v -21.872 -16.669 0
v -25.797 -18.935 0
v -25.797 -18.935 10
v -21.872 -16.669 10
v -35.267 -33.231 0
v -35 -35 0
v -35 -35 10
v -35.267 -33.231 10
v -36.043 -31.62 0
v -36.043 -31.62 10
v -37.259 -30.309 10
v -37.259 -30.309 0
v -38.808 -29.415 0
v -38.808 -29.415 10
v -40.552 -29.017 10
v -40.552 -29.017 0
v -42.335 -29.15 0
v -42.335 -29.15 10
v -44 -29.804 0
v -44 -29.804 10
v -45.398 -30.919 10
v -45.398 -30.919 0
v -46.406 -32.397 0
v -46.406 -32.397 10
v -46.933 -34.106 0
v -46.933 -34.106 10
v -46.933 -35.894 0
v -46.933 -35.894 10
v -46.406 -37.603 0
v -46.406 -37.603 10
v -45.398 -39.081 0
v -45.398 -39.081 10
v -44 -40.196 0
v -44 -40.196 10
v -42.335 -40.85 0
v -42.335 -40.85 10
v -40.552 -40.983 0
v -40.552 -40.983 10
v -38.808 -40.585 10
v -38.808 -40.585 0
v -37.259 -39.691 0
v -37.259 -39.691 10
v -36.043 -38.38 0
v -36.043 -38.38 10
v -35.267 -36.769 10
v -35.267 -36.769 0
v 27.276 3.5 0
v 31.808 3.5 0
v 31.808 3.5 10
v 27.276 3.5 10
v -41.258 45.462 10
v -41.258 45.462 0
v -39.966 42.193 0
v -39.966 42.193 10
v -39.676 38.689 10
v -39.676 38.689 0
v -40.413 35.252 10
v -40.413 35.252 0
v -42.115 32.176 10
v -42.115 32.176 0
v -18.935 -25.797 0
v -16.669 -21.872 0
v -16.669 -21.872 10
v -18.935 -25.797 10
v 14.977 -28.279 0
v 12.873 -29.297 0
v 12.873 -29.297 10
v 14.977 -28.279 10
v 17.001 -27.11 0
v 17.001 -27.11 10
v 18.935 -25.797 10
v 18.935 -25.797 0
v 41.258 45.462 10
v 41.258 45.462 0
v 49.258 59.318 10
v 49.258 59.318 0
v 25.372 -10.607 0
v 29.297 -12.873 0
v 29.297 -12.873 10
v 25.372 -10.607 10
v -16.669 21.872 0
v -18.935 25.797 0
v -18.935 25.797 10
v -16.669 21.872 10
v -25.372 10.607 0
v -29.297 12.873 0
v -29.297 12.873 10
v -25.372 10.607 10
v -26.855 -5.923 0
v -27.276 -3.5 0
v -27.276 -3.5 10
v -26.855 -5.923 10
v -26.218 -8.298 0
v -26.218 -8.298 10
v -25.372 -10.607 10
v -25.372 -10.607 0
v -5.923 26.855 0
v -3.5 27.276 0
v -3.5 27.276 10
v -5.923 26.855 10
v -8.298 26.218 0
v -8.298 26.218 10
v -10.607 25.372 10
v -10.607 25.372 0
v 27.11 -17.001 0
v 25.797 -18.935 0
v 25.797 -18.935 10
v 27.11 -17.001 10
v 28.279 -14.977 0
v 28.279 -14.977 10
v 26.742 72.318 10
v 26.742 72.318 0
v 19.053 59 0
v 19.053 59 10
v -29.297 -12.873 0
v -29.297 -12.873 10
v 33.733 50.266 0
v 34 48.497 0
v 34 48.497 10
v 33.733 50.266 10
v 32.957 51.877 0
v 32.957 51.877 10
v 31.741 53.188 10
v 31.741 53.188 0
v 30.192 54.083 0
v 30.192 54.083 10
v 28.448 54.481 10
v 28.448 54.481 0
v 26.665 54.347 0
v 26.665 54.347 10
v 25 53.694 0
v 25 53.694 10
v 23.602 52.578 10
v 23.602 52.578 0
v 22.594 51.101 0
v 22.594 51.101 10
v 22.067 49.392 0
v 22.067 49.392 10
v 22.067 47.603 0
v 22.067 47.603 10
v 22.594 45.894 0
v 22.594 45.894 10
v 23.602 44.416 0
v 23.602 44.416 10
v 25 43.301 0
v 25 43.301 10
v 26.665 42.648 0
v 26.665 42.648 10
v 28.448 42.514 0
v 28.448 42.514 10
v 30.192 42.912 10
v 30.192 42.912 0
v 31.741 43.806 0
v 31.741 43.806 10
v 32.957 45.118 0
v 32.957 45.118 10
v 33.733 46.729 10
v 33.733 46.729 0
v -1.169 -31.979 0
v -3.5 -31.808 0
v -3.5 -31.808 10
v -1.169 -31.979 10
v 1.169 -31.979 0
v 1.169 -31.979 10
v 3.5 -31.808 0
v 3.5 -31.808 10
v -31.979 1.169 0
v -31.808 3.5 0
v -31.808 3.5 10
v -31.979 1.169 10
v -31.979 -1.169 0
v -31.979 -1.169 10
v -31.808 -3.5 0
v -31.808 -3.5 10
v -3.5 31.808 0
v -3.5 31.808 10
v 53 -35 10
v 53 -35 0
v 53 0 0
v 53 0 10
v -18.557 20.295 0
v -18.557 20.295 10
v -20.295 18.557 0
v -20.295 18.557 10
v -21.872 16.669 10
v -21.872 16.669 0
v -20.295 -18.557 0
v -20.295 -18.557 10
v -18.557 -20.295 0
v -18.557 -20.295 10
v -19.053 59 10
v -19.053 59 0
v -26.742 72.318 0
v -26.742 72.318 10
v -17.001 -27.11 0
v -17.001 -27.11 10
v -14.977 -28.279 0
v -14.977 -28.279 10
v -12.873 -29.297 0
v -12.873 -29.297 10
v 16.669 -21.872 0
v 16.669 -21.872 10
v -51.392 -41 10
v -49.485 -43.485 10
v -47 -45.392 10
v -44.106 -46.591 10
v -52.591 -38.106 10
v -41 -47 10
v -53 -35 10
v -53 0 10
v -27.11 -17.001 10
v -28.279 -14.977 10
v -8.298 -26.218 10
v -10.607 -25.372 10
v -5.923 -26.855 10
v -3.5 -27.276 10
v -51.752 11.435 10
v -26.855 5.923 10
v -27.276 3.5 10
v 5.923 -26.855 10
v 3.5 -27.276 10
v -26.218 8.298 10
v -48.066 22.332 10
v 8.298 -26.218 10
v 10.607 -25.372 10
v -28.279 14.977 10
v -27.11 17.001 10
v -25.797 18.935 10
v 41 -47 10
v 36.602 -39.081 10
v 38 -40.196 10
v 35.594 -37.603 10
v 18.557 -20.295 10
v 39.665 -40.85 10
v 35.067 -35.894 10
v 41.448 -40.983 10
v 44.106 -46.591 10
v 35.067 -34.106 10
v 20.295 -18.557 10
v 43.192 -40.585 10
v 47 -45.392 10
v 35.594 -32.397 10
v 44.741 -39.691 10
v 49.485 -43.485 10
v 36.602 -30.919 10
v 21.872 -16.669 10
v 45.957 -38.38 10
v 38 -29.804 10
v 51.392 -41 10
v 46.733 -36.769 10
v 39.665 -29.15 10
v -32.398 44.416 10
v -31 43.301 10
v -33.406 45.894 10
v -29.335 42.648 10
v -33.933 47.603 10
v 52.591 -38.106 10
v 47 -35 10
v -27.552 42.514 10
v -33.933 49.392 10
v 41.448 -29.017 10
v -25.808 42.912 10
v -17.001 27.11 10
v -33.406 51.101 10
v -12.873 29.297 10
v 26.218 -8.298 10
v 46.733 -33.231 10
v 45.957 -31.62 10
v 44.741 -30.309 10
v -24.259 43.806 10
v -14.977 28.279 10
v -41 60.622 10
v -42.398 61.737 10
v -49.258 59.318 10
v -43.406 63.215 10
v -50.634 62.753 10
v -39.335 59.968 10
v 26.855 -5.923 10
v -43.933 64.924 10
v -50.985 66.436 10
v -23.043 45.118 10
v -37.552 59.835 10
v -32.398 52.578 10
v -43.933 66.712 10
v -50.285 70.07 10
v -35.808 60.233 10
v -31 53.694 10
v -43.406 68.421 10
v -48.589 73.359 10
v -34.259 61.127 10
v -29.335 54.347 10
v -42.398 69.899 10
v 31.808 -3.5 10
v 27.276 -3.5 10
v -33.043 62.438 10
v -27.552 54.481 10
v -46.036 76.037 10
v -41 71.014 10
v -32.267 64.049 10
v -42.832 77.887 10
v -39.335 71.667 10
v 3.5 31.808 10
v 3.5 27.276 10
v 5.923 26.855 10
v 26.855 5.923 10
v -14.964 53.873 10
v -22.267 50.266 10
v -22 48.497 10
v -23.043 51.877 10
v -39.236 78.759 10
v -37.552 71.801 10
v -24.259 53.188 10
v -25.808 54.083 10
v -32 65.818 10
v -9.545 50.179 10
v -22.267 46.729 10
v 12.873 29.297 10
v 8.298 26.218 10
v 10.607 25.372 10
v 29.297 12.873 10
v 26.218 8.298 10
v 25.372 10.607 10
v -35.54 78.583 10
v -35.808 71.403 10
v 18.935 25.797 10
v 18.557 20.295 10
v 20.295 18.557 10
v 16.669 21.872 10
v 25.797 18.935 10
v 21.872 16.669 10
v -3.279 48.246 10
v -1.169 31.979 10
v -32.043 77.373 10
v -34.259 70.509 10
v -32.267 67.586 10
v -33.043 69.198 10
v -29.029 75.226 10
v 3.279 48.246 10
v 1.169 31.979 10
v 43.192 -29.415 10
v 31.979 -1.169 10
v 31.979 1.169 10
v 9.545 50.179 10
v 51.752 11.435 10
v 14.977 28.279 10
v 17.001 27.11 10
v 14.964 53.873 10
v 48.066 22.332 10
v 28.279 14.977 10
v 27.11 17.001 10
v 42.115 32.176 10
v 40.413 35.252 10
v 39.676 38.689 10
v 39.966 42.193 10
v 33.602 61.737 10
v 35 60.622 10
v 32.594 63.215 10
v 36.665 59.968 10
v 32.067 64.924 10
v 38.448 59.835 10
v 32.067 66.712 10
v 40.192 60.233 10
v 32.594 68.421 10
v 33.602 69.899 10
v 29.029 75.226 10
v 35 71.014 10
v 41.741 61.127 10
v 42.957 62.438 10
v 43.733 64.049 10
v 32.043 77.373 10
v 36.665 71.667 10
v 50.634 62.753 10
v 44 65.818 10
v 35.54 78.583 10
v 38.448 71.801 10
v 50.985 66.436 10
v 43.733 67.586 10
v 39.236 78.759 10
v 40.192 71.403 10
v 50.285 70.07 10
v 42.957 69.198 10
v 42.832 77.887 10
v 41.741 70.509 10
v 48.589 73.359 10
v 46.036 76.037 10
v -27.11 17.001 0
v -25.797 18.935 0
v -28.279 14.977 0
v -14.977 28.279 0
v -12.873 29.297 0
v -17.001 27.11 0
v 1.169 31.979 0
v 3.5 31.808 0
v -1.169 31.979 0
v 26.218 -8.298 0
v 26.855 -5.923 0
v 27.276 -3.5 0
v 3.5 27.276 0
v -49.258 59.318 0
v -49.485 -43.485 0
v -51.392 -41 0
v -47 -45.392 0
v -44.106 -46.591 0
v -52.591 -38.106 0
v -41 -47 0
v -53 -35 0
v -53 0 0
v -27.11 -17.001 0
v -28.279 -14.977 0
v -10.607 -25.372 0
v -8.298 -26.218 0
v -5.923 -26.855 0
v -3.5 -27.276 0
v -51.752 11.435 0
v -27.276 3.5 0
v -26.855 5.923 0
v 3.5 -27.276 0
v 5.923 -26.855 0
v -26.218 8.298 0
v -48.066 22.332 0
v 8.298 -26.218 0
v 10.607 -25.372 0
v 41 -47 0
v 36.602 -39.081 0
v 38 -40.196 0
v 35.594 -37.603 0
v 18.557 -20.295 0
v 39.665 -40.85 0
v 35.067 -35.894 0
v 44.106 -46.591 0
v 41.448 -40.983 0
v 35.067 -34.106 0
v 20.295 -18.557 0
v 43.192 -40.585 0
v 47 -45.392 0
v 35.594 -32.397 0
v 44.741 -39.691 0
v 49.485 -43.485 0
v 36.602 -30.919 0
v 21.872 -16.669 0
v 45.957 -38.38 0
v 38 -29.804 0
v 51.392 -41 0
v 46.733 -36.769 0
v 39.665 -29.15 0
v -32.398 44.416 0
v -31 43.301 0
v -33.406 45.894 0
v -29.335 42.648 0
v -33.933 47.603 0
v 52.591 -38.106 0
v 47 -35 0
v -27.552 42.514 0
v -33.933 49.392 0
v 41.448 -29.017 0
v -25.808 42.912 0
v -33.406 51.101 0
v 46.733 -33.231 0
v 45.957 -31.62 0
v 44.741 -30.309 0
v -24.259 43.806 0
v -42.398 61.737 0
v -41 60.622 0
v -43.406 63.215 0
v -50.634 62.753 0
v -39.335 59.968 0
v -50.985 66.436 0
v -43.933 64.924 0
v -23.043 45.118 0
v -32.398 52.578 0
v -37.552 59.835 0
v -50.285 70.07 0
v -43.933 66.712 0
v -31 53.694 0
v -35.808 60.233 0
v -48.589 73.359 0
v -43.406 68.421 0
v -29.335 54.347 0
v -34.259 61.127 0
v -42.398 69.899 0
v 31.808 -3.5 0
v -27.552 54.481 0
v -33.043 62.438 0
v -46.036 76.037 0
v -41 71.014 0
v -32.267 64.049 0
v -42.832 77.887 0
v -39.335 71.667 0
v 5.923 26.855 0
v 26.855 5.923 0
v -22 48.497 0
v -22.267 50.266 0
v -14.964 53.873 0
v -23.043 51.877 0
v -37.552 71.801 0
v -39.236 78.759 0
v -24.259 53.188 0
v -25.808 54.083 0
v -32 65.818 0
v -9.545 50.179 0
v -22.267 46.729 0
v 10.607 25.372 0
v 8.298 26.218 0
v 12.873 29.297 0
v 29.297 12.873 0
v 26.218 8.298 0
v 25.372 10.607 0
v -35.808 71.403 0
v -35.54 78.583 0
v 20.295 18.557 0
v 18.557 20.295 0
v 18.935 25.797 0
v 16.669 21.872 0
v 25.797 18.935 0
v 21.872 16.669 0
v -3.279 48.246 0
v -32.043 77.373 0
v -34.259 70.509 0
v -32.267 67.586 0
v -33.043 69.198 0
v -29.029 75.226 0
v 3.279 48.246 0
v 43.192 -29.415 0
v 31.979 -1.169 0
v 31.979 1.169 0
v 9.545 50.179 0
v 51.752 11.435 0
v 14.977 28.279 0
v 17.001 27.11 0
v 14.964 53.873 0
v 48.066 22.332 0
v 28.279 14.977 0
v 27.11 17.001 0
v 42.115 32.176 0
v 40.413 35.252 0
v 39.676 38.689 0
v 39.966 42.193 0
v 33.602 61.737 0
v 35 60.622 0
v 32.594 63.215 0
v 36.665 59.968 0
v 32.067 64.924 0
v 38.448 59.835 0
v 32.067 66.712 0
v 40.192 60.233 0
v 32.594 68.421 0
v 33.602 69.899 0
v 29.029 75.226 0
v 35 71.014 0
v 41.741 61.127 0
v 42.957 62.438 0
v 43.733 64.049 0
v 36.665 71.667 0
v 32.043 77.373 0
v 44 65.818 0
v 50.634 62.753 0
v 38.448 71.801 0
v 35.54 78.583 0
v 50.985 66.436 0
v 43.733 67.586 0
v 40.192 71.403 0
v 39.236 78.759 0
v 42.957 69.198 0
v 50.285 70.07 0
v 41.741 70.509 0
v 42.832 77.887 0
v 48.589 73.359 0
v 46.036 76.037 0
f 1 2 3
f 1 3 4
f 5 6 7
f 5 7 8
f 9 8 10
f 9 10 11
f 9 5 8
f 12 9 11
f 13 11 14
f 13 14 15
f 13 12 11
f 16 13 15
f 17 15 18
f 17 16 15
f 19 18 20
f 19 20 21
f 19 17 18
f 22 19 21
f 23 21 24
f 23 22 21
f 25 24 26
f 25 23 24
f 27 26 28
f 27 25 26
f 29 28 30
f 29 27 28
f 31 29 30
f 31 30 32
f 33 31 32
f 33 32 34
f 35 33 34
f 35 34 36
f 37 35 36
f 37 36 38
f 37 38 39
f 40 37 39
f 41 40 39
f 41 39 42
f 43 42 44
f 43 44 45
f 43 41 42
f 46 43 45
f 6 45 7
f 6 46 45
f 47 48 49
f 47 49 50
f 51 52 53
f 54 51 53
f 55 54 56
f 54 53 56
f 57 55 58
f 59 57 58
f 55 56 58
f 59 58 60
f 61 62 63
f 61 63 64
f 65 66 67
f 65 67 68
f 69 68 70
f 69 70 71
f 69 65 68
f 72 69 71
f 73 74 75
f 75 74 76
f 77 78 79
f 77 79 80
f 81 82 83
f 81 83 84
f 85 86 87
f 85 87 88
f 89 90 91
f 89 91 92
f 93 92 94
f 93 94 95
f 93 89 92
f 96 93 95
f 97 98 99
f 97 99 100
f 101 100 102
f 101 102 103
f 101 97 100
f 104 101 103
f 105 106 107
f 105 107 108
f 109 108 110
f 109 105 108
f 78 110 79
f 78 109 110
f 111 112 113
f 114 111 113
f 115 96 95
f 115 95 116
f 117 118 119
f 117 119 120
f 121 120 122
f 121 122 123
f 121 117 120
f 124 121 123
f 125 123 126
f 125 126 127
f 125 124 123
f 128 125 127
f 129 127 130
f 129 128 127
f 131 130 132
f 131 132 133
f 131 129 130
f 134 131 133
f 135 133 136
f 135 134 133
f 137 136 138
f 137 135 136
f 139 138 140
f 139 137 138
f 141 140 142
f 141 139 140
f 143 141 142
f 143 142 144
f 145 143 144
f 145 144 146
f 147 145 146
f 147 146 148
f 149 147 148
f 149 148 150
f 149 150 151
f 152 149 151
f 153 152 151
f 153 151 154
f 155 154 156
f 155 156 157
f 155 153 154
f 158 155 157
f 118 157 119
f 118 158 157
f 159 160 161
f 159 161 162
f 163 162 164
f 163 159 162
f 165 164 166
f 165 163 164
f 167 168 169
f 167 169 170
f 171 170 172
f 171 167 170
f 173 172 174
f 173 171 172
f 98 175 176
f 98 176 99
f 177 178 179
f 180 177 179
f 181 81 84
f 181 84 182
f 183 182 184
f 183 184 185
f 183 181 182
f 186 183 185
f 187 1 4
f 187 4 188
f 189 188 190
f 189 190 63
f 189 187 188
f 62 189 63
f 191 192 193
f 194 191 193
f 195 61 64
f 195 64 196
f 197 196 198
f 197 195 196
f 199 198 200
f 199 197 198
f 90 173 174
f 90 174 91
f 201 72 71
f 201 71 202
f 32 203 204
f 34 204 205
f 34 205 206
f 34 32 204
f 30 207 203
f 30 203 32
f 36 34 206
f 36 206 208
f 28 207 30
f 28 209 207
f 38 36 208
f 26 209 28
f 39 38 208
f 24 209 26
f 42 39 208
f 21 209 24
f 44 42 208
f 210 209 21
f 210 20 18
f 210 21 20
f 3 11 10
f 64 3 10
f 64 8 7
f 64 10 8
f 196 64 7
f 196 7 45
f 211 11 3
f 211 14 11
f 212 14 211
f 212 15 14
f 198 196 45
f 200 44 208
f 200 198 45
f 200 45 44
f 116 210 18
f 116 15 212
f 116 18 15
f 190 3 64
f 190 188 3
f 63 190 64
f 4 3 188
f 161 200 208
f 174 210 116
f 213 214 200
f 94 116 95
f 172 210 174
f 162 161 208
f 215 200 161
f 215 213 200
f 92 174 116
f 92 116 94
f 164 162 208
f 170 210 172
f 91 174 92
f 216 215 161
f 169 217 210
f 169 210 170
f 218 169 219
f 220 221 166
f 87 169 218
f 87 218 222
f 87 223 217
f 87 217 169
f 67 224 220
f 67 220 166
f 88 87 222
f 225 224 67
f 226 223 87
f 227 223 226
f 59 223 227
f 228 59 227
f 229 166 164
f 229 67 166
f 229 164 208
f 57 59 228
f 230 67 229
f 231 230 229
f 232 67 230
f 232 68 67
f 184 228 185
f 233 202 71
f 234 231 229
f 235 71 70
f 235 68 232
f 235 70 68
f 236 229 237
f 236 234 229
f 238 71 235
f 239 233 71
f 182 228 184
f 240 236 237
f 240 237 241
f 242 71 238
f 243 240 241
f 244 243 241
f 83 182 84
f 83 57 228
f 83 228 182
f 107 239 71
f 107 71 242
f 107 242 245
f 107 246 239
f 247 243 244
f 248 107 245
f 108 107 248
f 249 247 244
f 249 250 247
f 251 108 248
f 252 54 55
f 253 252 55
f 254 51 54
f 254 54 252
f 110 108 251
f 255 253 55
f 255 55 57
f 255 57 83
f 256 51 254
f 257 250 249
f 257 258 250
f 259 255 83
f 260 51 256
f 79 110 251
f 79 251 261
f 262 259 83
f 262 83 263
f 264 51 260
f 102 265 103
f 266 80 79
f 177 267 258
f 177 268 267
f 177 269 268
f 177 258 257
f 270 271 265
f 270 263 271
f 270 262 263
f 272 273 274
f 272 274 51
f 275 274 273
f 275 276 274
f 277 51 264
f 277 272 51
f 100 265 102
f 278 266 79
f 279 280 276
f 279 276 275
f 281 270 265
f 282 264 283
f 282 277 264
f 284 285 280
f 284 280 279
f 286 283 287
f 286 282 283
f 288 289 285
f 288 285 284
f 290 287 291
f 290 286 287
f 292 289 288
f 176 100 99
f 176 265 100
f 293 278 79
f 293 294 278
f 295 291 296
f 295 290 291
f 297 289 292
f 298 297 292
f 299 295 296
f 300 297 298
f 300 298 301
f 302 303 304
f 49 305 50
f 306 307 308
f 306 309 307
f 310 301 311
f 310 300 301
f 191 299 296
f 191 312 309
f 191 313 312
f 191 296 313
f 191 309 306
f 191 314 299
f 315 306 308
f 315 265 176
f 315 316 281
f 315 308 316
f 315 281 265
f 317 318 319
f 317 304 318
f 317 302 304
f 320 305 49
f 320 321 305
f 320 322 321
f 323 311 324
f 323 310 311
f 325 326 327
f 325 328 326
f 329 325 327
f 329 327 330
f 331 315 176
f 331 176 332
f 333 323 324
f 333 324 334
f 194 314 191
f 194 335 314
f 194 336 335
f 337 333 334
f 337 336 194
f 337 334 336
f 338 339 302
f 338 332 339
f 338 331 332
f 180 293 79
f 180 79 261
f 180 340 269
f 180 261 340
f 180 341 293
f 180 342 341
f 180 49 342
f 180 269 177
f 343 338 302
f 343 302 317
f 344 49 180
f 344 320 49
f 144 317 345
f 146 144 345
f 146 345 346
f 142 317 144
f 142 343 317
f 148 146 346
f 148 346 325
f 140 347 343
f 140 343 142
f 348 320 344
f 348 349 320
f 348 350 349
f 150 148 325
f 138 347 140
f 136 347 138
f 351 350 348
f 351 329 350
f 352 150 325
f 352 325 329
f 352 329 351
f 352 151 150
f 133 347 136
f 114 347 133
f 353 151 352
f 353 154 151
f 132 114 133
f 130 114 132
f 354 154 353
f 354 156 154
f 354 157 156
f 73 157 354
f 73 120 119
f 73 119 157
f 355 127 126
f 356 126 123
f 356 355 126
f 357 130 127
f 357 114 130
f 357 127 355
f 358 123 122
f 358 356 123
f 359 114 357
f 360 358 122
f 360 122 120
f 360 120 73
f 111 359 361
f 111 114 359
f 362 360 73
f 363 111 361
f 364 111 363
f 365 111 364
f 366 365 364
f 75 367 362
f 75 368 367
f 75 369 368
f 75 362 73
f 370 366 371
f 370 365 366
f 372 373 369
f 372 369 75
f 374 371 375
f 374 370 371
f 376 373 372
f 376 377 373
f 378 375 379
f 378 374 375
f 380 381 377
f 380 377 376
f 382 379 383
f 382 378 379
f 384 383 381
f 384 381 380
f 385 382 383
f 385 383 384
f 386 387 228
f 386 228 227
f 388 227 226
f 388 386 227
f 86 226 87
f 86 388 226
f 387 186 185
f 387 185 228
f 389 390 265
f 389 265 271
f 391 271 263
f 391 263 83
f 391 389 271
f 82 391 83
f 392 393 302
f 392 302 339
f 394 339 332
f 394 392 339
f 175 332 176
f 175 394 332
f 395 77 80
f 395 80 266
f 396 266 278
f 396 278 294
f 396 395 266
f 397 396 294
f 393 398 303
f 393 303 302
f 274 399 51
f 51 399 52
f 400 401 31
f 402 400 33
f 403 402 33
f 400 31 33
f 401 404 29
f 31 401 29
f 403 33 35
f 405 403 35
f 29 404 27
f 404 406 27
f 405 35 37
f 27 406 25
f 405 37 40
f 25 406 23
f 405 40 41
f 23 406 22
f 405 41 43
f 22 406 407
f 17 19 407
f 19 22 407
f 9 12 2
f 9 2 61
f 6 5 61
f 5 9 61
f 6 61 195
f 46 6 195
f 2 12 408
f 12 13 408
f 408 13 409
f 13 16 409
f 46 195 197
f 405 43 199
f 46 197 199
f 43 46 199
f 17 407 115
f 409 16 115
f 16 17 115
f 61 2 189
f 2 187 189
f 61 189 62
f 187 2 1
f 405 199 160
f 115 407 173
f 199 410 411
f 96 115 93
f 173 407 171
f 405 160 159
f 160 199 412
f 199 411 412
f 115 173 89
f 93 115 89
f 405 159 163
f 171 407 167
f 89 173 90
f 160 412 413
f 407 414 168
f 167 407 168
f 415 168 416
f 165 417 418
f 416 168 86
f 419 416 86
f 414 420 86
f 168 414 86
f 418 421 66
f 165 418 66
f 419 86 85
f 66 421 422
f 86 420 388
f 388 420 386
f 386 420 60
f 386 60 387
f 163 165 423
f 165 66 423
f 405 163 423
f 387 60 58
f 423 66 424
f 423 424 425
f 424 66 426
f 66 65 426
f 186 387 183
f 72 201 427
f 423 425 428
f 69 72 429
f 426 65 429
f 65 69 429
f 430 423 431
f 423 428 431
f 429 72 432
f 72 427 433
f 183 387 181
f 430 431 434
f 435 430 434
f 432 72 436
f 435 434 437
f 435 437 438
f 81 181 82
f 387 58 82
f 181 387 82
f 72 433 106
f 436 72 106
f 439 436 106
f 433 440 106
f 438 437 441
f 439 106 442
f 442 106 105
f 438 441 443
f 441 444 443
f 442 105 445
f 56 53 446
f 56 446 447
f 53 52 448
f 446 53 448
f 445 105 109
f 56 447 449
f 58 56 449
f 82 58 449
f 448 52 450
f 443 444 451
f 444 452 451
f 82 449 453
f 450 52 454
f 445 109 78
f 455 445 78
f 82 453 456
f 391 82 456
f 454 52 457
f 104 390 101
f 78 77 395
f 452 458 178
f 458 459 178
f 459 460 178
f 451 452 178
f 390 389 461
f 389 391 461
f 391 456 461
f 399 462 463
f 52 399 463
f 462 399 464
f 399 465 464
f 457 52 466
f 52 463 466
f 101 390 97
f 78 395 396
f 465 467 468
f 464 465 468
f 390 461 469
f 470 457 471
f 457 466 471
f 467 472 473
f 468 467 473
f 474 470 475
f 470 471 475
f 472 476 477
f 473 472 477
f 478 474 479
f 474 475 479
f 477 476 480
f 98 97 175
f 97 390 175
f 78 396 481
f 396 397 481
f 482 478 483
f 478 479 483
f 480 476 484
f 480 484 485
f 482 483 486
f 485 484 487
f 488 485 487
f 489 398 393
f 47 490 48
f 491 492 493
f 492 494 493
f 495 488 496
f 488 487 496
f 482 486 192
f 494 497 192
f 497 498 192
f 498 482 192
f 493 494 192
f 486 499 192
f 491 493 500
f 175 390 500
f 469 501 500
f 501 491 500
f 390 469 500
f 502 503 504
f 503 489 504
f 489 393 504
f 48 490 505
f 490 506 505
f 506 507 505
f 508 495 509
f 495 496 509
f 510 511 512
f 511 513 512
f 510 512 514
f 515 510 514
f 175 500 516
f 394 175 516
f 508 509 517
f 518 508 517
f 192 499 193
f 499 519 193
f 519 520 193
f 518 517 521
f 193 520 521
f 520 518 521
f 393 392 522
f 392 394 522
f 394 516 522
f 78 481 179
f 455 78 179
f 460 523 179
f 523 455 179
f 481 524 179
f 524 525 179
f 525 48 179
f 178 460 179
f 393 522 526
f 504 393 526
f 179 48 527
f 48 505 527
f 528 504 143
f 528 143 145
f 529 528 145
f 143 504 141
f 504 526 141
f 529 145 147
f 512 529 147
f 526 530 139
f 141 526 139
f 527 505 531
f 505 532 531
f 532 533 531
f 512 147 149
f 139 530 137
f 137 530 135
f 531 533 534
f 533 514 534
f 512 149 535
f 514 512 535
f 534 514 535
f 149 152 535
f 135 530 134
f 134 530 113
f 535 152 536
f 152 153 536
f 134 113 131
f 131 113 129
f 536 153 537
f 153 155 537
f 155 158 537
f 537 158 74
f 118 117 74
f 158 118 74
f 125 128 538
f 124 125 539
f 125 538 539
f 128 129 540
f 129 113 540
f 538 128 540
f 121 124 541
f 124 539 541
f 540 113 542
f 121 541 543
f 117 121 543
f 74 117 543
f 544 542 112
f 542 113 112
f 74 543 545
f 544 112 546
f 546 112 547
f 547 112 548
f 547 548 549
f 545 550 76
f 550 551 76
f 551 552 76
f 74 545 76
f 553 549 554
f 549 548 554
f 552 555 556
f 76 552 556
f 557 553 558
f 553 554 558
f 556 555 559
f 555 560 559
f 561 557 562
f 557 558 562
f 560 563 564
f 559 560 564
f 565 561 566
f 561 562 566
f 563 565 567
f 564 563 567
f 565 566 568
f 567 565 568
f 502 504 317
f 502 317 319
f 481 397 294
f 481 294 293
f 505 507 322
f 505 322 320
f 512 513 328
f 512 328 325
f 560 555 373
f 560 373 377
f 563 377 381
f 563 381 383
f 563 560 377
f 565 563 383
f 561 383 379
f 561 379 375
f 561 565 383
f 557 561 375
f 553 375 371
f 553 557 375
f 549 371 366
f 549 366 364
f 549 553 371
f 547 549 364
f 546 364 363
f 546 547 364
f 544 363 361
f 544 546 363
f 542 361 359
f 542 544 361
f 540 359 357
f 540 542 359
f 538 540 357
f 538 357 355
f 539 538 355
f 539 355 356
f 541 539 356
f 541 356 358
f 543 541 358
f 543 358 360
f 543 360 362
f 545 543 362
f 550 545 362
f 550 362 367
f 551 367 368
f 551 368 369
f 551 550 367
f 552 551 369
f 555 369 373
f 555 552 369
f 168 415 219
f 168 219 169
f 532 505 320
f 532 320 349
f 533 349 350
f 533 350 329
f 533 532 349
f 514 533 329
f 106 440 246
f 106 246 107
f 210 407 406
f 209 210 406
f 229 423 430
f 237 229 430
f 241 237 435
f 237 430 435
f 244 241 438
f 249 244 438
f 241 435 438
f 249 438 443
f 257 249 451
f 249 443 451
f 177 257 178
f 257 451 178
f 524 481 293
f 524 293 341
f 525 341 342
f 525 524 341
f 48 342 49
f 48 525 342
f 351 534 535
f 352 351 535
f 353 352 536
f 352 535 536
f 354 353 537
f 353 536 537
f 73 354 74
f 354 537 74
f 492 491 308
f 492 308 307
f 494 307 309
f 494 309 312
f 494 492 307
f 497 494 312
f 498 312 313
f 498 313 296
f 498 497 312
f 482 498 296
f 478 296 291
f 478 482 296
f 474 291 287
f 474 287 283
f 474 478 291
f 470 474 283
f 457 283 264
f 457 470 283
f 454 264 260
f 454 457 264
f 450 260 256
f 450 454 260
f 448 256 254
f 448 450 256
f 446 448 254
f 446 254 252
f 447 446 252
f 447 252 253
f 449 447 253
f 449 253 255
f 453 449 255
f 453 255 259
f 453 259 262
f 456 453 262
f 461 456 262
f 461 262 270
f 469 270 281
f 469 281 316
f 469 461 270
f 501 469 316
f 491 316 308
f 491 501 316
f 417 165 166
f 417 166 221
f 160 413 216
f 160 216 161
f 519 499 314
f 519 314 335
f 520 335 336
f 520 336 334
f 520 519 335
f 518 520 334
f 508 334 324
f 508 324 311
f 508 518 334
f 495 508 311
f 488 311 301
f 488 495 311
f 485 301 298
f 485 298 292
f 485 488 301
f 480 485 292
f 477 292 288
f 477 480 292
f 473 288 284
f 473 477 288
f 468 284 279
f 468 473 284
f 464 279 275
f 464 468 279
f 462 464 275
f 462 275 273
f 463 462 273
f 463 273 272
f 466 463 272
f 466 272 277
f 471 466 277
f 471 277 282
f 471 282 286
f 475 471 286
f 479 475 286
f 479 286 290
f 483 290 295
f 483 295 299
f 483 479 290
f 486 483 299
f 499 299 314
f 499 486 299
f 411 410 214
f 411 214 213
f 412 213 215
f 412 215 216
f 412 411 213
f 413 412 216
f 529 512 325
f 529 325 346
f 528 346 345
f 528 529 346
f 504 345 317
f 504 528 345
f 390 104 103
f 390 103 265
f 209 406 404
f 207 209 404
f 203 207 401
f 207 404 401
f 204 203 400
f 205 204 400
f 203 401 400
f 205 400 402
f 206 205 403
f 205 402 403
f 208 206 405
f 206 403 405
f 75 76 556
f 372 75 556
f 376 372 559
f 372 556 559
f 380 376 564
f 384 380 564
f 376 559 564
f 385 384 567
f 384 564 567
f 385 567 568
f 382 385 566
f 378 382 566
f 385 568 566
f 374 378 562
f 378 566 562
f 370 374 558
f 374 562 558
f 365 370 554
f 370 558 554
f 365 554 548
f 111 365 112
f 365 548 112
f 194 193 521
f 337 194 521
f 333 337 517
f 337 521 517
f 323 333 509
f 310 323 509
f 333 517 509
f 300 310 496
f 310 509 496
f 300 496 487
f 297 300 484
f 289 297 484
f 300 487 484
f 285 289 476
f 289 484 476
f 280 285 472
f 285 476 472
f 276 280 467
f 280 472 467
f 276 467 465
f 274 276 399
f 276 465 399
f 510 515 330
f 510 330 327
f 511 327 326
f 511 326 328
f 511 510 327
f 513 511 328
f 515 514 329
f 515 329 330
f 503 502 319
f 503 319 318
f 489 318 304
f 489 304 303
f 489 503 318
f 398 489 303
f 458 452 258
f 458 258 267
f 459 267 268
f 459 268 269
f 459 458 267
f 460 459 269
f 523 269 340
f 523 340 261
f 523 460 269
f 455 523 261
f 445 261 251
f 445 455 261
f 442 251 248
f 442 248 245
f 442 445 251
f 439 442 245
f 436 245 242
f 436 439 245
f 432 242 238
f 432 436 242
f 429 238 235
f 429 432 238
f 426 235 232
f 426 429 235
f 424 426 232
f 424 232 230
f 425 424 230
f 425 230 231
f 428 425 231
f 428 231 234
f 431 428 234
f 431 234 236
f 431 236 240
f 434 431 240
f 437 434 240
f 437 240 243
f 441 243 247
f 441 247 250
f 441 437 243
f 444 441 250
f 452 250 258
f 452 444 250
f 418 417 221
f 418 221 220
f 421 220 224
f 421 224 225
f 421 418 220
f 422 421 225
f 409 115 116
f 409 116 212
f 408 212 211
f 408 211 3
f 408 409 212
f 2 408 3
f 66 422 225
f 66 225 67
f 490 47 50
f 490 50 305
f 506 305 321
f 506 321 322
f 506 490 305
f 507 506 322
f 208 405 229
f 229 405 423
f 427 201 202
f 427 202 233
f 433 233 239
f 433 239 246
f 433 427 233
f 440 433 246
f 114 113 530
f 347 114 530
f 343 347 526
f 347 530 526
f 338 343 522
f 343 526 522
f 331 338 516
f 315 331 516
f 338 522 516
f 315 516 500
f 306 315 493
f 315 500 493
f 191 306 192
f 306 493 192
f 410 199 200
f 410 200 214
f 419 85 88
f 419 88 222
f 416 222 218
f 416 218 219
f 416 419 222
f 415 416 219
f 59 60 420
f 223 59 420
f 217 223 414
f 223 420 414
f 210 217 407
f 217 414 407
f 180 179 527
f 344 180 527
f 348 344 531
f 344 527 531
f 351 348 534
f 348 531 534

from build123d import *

# Parameters (mm, degrees)
CROQUIS1_R              = 6
CROQUIS1_R_2            = 41
SALIENTE_EXTRUIR1_DEPTH = 10


with BuildPart() as part:
    # Croquis1 → Saliente-Extruir1 (new body)
    # profile 1 of 2: a face of its own
    with BuildSketch(Plane.XY):
        with BuildLine():
            ThreePointArc((49.258330249, 59.317930688), (44.5, 77.076260937), (26.741669751, 72.317930688))
            Line((26.741669751, 72.317930688), (19.052558883, 59))
            ThreePointArc((19.052558883, 59), (0, 48), (-19.052558883, 59))
            Line((-19.052558883, 59), (-26.741669751, 72.317930688))
            ThreePointArc((-26.741669751, 72.317930688), (-44.5, 77.076260937), (-49.258330249, 59.317930688))
            Line((-49.258330249, 59.317930688), (-41.258335188, 45.461532781))
            ThreePointArc((-41.258335188, 45.461532781), (-39.675518573, 38.68922066), (-42.115138595, 32.176327751))
            ThreePointArc((-42.115138595, 32.176327751), (-50.205097588, 16.983790583), (-53, 0))
            Line((-53, 0), (-53, -35))
            ThreePointArc((-53, -35), (-49.485281374, -43.485281374), (-41, -47))
            Line((-41, -47), (-9.521486782, -47))
            Line((-9.521486782, -47), (9.521486782, -47))
            Line((9.521486782, -47), (41, -47))
            ThreePointArc((41, -47), (49.485281374, -43.485281374), (53, -35))
            Line((53, -35), (53, 0))
            ThreePointArc((53, 0), (50.205097588, 16.983790583), (42.115138595, 32.176327751))
            ThreePointArc((42.115138595, 32.176327751), (39.675518573, 38.68922066), (41.258335188, 45.461532781))
            Line((41.258335188, 45.461532781), (49.258330249, 59.317930688))
        make_face()
        with Locations((-41, -35)):
            Circle(CROQUIS1_R, mode=Mode.SUBTRACT)
        with Locations((41, -35)):
            Circle(CROQUIS1_R, mode=Mode.SUBTRACT)
        Circle(CROQUIS1_R_2, mode=Mode.SUBTRACT)
        with Locations((-28, 48.497422612)):
            Circle(CROQUIS1_R, mode=Mode.SUBTRACT)
        with Locations((-38, 65.817930688)):
            Circle(CROQUIS1_R, mode=Mode.SUBTRACT)
        with Locations((28, 48.497422612)):
            Circle(CROQUIS1_R, mode=Mode.SUBTRACT)
        with Locations((38, 65.817930688)):
            Circle(CROQUIS1_R, mode=Mode.SUBTRACT)
    # profile 2 of 2: a face of its own
    with BuildSketch(Plane.XY):
        Circle(CROQUIS1_R_2)
        with BuildLine():
            ThreePointArc((10.607092784, 25.372023622), (7.11752374, 26.562960223), (3.5, 27.276363394))
            Line((3.5, 27.276363394), (3.5, 31.808017857))
            ThreePointArc((3.5, 31.808017857), (0, 32), (-3.5, 31.808017857))
            Line((-3.5, 31.808017857), (-3.5, 27.276363394))
            ThreePointArc((-3.5, 27.276363394), (-7.11752374, 26.562960223), (-10.607092784, 25.372023622))
            Line((-10.607092784, 25.372023622), (-12.872920015, 29.296551508))
            ThreePointArc((-12.872920015, 29.296551508), (-16, 27.712812921), (-18.935097842, 25.796551508))
            Line((-18.935097842, 25.796551508), (-16.66927061, 21.872023622))
            ThreePointArc((-16.66927061, 21.872023622), (-19.445436483, 19.445436483), (-21.872023622, 16.66927061))
            Line((-21.872023622, 16.66927061), (-25.796551508, 18.935097842))
            ThreePointArc((-25.796551508, 18.935097842), (-27.712812921, 16), (-29.296551508, 12.872920015))
            Line((-29.296551508, 12.872920015), (-25.372023622, 10.607092784))
            ThreePointArc((-25.372023622, 10.607092784), (-26.562960223, 7.11752374), (-27.276363394, 3.5))
            Line((-27.276363394, 3.5), (-31.808017857, 3.5))
            ThreePointArc((-31.808017857, 3.5), (-32, 0), (-31.808017857, -3.5))
            Line((-31.808017857, -3.5), (-27.276363394, -3.5))
            ThreePointArc((-27.276363394, -3.5), (-26.562960223, -7.11752374), (-25.372023622, -10.607092784))
            Line((-25.372023622, -10.607092784), (-29.296551508, -12.872920015))
            ThreePointArc((-29.296551508, -12.872920015), (-27.712812921, -16), (-25.796551508, -18.935097842))
            Line((-25.796551508, -18.935097842), (-21.872023622, -16.66927061))
            ThreePointArc((-21.872023622, -16.66927061), (-19.445436483, -19.445436483), (-16.66927061, -21.872023622))
            Line((-16.66927061, -21.872023622), (-18.935097842, -25.796551508))
            ThreePointArc((-18.935097842, -25.796551508), (-16, -27.712812921), (-12.872920015, -29.296551508))
            Line((-12.872920015, -29.296551508), (-10.607092784, -25.372023622))
            ThreePointArc((-10.607092784, -25.372023622), (-7.11752374, -26.562960223), (-3.5, -27.276363394))
            Line((-3.5, -27.276363394), (-3.5, -31.808017857))
            ThreePointArc((-3.5, -31.808017857), (0, -32), (3.5, -31.808017857))
            Line((3.5, -31.808017857), (3.5, -27.276363394))
            ThreePointArc((3.5, -27.276363394), (7.11752374, -26.562960223), (10.607092784, -25.372023622))
            Line((10.607092784, -25.372023622), (12.872920015, -29.296551508))
            ThreePointArc((12.872920015, -29.296551508), (16, -27.712812921), (18.935097842, -25.796551508))
            Line((18.935097842, -25.796551508), (16.66927061, -21.872023622))
            ThreePointArc((16.66927061, -21.872023622), (19.445436483, -19.445436483), (21.872023622, -16.66927061))
            Line((21.872023622, -16.66927061), (25.796551508, -18.935097842))
            ThreePointArc((25.796551508, -18.935097842), (27.712812921, -16), (29.296551508, -12.872920015))
            Line((29.296551508, -12.872920015), (25.372023622, -10.607092784))
            ThreePointArc((25.372023622, -10.607092784), (26.562960223, -7.11752374), (27.276363394, -3.5))
            Line((27.276363394, -3.5), (31.808017857, -3.5))
            ThreePointArc((31.808017857, -3.5), (32, 0), (31.808017857, 3.5))
            Line((31.808017857, 3.5), (27.276363394, 3.5))
            ThreePointArc((27.276363394, 3.5), (26.562960223, 7.11752374), (25.372023622, 10.607092784))
            Line((25.372023622, 10.607092784), (29.296551508, 12.872920015))
            ThreePointArc((29.296551508, 12.872920015), (27.712812921, 16), (25.796551508, 18.935097842))
            Line((25.796551508, 18.935097842), (21.872023622, 16.66927061))
            ThreePointArc((21.872023622, 16.66927061), (19.445436483, 19.445436483), (16.66927061, 21.872023622))
            Line((16.66927061, 21.872023622), (18.935097842, 25.796551508))
            ThreePointArc((18.935097842, 25.796551508), (16, 27.712812921), (12.872920015, 29.296551508))
            Line((12.872920015, 29.296551508), (10.607092784, 25.372023622))
        make_face(mode=Mode.SUBTRACT)
    extrude(amount=SALIENTE_EXTRUIR1_DEPTH)


solid = part.part
